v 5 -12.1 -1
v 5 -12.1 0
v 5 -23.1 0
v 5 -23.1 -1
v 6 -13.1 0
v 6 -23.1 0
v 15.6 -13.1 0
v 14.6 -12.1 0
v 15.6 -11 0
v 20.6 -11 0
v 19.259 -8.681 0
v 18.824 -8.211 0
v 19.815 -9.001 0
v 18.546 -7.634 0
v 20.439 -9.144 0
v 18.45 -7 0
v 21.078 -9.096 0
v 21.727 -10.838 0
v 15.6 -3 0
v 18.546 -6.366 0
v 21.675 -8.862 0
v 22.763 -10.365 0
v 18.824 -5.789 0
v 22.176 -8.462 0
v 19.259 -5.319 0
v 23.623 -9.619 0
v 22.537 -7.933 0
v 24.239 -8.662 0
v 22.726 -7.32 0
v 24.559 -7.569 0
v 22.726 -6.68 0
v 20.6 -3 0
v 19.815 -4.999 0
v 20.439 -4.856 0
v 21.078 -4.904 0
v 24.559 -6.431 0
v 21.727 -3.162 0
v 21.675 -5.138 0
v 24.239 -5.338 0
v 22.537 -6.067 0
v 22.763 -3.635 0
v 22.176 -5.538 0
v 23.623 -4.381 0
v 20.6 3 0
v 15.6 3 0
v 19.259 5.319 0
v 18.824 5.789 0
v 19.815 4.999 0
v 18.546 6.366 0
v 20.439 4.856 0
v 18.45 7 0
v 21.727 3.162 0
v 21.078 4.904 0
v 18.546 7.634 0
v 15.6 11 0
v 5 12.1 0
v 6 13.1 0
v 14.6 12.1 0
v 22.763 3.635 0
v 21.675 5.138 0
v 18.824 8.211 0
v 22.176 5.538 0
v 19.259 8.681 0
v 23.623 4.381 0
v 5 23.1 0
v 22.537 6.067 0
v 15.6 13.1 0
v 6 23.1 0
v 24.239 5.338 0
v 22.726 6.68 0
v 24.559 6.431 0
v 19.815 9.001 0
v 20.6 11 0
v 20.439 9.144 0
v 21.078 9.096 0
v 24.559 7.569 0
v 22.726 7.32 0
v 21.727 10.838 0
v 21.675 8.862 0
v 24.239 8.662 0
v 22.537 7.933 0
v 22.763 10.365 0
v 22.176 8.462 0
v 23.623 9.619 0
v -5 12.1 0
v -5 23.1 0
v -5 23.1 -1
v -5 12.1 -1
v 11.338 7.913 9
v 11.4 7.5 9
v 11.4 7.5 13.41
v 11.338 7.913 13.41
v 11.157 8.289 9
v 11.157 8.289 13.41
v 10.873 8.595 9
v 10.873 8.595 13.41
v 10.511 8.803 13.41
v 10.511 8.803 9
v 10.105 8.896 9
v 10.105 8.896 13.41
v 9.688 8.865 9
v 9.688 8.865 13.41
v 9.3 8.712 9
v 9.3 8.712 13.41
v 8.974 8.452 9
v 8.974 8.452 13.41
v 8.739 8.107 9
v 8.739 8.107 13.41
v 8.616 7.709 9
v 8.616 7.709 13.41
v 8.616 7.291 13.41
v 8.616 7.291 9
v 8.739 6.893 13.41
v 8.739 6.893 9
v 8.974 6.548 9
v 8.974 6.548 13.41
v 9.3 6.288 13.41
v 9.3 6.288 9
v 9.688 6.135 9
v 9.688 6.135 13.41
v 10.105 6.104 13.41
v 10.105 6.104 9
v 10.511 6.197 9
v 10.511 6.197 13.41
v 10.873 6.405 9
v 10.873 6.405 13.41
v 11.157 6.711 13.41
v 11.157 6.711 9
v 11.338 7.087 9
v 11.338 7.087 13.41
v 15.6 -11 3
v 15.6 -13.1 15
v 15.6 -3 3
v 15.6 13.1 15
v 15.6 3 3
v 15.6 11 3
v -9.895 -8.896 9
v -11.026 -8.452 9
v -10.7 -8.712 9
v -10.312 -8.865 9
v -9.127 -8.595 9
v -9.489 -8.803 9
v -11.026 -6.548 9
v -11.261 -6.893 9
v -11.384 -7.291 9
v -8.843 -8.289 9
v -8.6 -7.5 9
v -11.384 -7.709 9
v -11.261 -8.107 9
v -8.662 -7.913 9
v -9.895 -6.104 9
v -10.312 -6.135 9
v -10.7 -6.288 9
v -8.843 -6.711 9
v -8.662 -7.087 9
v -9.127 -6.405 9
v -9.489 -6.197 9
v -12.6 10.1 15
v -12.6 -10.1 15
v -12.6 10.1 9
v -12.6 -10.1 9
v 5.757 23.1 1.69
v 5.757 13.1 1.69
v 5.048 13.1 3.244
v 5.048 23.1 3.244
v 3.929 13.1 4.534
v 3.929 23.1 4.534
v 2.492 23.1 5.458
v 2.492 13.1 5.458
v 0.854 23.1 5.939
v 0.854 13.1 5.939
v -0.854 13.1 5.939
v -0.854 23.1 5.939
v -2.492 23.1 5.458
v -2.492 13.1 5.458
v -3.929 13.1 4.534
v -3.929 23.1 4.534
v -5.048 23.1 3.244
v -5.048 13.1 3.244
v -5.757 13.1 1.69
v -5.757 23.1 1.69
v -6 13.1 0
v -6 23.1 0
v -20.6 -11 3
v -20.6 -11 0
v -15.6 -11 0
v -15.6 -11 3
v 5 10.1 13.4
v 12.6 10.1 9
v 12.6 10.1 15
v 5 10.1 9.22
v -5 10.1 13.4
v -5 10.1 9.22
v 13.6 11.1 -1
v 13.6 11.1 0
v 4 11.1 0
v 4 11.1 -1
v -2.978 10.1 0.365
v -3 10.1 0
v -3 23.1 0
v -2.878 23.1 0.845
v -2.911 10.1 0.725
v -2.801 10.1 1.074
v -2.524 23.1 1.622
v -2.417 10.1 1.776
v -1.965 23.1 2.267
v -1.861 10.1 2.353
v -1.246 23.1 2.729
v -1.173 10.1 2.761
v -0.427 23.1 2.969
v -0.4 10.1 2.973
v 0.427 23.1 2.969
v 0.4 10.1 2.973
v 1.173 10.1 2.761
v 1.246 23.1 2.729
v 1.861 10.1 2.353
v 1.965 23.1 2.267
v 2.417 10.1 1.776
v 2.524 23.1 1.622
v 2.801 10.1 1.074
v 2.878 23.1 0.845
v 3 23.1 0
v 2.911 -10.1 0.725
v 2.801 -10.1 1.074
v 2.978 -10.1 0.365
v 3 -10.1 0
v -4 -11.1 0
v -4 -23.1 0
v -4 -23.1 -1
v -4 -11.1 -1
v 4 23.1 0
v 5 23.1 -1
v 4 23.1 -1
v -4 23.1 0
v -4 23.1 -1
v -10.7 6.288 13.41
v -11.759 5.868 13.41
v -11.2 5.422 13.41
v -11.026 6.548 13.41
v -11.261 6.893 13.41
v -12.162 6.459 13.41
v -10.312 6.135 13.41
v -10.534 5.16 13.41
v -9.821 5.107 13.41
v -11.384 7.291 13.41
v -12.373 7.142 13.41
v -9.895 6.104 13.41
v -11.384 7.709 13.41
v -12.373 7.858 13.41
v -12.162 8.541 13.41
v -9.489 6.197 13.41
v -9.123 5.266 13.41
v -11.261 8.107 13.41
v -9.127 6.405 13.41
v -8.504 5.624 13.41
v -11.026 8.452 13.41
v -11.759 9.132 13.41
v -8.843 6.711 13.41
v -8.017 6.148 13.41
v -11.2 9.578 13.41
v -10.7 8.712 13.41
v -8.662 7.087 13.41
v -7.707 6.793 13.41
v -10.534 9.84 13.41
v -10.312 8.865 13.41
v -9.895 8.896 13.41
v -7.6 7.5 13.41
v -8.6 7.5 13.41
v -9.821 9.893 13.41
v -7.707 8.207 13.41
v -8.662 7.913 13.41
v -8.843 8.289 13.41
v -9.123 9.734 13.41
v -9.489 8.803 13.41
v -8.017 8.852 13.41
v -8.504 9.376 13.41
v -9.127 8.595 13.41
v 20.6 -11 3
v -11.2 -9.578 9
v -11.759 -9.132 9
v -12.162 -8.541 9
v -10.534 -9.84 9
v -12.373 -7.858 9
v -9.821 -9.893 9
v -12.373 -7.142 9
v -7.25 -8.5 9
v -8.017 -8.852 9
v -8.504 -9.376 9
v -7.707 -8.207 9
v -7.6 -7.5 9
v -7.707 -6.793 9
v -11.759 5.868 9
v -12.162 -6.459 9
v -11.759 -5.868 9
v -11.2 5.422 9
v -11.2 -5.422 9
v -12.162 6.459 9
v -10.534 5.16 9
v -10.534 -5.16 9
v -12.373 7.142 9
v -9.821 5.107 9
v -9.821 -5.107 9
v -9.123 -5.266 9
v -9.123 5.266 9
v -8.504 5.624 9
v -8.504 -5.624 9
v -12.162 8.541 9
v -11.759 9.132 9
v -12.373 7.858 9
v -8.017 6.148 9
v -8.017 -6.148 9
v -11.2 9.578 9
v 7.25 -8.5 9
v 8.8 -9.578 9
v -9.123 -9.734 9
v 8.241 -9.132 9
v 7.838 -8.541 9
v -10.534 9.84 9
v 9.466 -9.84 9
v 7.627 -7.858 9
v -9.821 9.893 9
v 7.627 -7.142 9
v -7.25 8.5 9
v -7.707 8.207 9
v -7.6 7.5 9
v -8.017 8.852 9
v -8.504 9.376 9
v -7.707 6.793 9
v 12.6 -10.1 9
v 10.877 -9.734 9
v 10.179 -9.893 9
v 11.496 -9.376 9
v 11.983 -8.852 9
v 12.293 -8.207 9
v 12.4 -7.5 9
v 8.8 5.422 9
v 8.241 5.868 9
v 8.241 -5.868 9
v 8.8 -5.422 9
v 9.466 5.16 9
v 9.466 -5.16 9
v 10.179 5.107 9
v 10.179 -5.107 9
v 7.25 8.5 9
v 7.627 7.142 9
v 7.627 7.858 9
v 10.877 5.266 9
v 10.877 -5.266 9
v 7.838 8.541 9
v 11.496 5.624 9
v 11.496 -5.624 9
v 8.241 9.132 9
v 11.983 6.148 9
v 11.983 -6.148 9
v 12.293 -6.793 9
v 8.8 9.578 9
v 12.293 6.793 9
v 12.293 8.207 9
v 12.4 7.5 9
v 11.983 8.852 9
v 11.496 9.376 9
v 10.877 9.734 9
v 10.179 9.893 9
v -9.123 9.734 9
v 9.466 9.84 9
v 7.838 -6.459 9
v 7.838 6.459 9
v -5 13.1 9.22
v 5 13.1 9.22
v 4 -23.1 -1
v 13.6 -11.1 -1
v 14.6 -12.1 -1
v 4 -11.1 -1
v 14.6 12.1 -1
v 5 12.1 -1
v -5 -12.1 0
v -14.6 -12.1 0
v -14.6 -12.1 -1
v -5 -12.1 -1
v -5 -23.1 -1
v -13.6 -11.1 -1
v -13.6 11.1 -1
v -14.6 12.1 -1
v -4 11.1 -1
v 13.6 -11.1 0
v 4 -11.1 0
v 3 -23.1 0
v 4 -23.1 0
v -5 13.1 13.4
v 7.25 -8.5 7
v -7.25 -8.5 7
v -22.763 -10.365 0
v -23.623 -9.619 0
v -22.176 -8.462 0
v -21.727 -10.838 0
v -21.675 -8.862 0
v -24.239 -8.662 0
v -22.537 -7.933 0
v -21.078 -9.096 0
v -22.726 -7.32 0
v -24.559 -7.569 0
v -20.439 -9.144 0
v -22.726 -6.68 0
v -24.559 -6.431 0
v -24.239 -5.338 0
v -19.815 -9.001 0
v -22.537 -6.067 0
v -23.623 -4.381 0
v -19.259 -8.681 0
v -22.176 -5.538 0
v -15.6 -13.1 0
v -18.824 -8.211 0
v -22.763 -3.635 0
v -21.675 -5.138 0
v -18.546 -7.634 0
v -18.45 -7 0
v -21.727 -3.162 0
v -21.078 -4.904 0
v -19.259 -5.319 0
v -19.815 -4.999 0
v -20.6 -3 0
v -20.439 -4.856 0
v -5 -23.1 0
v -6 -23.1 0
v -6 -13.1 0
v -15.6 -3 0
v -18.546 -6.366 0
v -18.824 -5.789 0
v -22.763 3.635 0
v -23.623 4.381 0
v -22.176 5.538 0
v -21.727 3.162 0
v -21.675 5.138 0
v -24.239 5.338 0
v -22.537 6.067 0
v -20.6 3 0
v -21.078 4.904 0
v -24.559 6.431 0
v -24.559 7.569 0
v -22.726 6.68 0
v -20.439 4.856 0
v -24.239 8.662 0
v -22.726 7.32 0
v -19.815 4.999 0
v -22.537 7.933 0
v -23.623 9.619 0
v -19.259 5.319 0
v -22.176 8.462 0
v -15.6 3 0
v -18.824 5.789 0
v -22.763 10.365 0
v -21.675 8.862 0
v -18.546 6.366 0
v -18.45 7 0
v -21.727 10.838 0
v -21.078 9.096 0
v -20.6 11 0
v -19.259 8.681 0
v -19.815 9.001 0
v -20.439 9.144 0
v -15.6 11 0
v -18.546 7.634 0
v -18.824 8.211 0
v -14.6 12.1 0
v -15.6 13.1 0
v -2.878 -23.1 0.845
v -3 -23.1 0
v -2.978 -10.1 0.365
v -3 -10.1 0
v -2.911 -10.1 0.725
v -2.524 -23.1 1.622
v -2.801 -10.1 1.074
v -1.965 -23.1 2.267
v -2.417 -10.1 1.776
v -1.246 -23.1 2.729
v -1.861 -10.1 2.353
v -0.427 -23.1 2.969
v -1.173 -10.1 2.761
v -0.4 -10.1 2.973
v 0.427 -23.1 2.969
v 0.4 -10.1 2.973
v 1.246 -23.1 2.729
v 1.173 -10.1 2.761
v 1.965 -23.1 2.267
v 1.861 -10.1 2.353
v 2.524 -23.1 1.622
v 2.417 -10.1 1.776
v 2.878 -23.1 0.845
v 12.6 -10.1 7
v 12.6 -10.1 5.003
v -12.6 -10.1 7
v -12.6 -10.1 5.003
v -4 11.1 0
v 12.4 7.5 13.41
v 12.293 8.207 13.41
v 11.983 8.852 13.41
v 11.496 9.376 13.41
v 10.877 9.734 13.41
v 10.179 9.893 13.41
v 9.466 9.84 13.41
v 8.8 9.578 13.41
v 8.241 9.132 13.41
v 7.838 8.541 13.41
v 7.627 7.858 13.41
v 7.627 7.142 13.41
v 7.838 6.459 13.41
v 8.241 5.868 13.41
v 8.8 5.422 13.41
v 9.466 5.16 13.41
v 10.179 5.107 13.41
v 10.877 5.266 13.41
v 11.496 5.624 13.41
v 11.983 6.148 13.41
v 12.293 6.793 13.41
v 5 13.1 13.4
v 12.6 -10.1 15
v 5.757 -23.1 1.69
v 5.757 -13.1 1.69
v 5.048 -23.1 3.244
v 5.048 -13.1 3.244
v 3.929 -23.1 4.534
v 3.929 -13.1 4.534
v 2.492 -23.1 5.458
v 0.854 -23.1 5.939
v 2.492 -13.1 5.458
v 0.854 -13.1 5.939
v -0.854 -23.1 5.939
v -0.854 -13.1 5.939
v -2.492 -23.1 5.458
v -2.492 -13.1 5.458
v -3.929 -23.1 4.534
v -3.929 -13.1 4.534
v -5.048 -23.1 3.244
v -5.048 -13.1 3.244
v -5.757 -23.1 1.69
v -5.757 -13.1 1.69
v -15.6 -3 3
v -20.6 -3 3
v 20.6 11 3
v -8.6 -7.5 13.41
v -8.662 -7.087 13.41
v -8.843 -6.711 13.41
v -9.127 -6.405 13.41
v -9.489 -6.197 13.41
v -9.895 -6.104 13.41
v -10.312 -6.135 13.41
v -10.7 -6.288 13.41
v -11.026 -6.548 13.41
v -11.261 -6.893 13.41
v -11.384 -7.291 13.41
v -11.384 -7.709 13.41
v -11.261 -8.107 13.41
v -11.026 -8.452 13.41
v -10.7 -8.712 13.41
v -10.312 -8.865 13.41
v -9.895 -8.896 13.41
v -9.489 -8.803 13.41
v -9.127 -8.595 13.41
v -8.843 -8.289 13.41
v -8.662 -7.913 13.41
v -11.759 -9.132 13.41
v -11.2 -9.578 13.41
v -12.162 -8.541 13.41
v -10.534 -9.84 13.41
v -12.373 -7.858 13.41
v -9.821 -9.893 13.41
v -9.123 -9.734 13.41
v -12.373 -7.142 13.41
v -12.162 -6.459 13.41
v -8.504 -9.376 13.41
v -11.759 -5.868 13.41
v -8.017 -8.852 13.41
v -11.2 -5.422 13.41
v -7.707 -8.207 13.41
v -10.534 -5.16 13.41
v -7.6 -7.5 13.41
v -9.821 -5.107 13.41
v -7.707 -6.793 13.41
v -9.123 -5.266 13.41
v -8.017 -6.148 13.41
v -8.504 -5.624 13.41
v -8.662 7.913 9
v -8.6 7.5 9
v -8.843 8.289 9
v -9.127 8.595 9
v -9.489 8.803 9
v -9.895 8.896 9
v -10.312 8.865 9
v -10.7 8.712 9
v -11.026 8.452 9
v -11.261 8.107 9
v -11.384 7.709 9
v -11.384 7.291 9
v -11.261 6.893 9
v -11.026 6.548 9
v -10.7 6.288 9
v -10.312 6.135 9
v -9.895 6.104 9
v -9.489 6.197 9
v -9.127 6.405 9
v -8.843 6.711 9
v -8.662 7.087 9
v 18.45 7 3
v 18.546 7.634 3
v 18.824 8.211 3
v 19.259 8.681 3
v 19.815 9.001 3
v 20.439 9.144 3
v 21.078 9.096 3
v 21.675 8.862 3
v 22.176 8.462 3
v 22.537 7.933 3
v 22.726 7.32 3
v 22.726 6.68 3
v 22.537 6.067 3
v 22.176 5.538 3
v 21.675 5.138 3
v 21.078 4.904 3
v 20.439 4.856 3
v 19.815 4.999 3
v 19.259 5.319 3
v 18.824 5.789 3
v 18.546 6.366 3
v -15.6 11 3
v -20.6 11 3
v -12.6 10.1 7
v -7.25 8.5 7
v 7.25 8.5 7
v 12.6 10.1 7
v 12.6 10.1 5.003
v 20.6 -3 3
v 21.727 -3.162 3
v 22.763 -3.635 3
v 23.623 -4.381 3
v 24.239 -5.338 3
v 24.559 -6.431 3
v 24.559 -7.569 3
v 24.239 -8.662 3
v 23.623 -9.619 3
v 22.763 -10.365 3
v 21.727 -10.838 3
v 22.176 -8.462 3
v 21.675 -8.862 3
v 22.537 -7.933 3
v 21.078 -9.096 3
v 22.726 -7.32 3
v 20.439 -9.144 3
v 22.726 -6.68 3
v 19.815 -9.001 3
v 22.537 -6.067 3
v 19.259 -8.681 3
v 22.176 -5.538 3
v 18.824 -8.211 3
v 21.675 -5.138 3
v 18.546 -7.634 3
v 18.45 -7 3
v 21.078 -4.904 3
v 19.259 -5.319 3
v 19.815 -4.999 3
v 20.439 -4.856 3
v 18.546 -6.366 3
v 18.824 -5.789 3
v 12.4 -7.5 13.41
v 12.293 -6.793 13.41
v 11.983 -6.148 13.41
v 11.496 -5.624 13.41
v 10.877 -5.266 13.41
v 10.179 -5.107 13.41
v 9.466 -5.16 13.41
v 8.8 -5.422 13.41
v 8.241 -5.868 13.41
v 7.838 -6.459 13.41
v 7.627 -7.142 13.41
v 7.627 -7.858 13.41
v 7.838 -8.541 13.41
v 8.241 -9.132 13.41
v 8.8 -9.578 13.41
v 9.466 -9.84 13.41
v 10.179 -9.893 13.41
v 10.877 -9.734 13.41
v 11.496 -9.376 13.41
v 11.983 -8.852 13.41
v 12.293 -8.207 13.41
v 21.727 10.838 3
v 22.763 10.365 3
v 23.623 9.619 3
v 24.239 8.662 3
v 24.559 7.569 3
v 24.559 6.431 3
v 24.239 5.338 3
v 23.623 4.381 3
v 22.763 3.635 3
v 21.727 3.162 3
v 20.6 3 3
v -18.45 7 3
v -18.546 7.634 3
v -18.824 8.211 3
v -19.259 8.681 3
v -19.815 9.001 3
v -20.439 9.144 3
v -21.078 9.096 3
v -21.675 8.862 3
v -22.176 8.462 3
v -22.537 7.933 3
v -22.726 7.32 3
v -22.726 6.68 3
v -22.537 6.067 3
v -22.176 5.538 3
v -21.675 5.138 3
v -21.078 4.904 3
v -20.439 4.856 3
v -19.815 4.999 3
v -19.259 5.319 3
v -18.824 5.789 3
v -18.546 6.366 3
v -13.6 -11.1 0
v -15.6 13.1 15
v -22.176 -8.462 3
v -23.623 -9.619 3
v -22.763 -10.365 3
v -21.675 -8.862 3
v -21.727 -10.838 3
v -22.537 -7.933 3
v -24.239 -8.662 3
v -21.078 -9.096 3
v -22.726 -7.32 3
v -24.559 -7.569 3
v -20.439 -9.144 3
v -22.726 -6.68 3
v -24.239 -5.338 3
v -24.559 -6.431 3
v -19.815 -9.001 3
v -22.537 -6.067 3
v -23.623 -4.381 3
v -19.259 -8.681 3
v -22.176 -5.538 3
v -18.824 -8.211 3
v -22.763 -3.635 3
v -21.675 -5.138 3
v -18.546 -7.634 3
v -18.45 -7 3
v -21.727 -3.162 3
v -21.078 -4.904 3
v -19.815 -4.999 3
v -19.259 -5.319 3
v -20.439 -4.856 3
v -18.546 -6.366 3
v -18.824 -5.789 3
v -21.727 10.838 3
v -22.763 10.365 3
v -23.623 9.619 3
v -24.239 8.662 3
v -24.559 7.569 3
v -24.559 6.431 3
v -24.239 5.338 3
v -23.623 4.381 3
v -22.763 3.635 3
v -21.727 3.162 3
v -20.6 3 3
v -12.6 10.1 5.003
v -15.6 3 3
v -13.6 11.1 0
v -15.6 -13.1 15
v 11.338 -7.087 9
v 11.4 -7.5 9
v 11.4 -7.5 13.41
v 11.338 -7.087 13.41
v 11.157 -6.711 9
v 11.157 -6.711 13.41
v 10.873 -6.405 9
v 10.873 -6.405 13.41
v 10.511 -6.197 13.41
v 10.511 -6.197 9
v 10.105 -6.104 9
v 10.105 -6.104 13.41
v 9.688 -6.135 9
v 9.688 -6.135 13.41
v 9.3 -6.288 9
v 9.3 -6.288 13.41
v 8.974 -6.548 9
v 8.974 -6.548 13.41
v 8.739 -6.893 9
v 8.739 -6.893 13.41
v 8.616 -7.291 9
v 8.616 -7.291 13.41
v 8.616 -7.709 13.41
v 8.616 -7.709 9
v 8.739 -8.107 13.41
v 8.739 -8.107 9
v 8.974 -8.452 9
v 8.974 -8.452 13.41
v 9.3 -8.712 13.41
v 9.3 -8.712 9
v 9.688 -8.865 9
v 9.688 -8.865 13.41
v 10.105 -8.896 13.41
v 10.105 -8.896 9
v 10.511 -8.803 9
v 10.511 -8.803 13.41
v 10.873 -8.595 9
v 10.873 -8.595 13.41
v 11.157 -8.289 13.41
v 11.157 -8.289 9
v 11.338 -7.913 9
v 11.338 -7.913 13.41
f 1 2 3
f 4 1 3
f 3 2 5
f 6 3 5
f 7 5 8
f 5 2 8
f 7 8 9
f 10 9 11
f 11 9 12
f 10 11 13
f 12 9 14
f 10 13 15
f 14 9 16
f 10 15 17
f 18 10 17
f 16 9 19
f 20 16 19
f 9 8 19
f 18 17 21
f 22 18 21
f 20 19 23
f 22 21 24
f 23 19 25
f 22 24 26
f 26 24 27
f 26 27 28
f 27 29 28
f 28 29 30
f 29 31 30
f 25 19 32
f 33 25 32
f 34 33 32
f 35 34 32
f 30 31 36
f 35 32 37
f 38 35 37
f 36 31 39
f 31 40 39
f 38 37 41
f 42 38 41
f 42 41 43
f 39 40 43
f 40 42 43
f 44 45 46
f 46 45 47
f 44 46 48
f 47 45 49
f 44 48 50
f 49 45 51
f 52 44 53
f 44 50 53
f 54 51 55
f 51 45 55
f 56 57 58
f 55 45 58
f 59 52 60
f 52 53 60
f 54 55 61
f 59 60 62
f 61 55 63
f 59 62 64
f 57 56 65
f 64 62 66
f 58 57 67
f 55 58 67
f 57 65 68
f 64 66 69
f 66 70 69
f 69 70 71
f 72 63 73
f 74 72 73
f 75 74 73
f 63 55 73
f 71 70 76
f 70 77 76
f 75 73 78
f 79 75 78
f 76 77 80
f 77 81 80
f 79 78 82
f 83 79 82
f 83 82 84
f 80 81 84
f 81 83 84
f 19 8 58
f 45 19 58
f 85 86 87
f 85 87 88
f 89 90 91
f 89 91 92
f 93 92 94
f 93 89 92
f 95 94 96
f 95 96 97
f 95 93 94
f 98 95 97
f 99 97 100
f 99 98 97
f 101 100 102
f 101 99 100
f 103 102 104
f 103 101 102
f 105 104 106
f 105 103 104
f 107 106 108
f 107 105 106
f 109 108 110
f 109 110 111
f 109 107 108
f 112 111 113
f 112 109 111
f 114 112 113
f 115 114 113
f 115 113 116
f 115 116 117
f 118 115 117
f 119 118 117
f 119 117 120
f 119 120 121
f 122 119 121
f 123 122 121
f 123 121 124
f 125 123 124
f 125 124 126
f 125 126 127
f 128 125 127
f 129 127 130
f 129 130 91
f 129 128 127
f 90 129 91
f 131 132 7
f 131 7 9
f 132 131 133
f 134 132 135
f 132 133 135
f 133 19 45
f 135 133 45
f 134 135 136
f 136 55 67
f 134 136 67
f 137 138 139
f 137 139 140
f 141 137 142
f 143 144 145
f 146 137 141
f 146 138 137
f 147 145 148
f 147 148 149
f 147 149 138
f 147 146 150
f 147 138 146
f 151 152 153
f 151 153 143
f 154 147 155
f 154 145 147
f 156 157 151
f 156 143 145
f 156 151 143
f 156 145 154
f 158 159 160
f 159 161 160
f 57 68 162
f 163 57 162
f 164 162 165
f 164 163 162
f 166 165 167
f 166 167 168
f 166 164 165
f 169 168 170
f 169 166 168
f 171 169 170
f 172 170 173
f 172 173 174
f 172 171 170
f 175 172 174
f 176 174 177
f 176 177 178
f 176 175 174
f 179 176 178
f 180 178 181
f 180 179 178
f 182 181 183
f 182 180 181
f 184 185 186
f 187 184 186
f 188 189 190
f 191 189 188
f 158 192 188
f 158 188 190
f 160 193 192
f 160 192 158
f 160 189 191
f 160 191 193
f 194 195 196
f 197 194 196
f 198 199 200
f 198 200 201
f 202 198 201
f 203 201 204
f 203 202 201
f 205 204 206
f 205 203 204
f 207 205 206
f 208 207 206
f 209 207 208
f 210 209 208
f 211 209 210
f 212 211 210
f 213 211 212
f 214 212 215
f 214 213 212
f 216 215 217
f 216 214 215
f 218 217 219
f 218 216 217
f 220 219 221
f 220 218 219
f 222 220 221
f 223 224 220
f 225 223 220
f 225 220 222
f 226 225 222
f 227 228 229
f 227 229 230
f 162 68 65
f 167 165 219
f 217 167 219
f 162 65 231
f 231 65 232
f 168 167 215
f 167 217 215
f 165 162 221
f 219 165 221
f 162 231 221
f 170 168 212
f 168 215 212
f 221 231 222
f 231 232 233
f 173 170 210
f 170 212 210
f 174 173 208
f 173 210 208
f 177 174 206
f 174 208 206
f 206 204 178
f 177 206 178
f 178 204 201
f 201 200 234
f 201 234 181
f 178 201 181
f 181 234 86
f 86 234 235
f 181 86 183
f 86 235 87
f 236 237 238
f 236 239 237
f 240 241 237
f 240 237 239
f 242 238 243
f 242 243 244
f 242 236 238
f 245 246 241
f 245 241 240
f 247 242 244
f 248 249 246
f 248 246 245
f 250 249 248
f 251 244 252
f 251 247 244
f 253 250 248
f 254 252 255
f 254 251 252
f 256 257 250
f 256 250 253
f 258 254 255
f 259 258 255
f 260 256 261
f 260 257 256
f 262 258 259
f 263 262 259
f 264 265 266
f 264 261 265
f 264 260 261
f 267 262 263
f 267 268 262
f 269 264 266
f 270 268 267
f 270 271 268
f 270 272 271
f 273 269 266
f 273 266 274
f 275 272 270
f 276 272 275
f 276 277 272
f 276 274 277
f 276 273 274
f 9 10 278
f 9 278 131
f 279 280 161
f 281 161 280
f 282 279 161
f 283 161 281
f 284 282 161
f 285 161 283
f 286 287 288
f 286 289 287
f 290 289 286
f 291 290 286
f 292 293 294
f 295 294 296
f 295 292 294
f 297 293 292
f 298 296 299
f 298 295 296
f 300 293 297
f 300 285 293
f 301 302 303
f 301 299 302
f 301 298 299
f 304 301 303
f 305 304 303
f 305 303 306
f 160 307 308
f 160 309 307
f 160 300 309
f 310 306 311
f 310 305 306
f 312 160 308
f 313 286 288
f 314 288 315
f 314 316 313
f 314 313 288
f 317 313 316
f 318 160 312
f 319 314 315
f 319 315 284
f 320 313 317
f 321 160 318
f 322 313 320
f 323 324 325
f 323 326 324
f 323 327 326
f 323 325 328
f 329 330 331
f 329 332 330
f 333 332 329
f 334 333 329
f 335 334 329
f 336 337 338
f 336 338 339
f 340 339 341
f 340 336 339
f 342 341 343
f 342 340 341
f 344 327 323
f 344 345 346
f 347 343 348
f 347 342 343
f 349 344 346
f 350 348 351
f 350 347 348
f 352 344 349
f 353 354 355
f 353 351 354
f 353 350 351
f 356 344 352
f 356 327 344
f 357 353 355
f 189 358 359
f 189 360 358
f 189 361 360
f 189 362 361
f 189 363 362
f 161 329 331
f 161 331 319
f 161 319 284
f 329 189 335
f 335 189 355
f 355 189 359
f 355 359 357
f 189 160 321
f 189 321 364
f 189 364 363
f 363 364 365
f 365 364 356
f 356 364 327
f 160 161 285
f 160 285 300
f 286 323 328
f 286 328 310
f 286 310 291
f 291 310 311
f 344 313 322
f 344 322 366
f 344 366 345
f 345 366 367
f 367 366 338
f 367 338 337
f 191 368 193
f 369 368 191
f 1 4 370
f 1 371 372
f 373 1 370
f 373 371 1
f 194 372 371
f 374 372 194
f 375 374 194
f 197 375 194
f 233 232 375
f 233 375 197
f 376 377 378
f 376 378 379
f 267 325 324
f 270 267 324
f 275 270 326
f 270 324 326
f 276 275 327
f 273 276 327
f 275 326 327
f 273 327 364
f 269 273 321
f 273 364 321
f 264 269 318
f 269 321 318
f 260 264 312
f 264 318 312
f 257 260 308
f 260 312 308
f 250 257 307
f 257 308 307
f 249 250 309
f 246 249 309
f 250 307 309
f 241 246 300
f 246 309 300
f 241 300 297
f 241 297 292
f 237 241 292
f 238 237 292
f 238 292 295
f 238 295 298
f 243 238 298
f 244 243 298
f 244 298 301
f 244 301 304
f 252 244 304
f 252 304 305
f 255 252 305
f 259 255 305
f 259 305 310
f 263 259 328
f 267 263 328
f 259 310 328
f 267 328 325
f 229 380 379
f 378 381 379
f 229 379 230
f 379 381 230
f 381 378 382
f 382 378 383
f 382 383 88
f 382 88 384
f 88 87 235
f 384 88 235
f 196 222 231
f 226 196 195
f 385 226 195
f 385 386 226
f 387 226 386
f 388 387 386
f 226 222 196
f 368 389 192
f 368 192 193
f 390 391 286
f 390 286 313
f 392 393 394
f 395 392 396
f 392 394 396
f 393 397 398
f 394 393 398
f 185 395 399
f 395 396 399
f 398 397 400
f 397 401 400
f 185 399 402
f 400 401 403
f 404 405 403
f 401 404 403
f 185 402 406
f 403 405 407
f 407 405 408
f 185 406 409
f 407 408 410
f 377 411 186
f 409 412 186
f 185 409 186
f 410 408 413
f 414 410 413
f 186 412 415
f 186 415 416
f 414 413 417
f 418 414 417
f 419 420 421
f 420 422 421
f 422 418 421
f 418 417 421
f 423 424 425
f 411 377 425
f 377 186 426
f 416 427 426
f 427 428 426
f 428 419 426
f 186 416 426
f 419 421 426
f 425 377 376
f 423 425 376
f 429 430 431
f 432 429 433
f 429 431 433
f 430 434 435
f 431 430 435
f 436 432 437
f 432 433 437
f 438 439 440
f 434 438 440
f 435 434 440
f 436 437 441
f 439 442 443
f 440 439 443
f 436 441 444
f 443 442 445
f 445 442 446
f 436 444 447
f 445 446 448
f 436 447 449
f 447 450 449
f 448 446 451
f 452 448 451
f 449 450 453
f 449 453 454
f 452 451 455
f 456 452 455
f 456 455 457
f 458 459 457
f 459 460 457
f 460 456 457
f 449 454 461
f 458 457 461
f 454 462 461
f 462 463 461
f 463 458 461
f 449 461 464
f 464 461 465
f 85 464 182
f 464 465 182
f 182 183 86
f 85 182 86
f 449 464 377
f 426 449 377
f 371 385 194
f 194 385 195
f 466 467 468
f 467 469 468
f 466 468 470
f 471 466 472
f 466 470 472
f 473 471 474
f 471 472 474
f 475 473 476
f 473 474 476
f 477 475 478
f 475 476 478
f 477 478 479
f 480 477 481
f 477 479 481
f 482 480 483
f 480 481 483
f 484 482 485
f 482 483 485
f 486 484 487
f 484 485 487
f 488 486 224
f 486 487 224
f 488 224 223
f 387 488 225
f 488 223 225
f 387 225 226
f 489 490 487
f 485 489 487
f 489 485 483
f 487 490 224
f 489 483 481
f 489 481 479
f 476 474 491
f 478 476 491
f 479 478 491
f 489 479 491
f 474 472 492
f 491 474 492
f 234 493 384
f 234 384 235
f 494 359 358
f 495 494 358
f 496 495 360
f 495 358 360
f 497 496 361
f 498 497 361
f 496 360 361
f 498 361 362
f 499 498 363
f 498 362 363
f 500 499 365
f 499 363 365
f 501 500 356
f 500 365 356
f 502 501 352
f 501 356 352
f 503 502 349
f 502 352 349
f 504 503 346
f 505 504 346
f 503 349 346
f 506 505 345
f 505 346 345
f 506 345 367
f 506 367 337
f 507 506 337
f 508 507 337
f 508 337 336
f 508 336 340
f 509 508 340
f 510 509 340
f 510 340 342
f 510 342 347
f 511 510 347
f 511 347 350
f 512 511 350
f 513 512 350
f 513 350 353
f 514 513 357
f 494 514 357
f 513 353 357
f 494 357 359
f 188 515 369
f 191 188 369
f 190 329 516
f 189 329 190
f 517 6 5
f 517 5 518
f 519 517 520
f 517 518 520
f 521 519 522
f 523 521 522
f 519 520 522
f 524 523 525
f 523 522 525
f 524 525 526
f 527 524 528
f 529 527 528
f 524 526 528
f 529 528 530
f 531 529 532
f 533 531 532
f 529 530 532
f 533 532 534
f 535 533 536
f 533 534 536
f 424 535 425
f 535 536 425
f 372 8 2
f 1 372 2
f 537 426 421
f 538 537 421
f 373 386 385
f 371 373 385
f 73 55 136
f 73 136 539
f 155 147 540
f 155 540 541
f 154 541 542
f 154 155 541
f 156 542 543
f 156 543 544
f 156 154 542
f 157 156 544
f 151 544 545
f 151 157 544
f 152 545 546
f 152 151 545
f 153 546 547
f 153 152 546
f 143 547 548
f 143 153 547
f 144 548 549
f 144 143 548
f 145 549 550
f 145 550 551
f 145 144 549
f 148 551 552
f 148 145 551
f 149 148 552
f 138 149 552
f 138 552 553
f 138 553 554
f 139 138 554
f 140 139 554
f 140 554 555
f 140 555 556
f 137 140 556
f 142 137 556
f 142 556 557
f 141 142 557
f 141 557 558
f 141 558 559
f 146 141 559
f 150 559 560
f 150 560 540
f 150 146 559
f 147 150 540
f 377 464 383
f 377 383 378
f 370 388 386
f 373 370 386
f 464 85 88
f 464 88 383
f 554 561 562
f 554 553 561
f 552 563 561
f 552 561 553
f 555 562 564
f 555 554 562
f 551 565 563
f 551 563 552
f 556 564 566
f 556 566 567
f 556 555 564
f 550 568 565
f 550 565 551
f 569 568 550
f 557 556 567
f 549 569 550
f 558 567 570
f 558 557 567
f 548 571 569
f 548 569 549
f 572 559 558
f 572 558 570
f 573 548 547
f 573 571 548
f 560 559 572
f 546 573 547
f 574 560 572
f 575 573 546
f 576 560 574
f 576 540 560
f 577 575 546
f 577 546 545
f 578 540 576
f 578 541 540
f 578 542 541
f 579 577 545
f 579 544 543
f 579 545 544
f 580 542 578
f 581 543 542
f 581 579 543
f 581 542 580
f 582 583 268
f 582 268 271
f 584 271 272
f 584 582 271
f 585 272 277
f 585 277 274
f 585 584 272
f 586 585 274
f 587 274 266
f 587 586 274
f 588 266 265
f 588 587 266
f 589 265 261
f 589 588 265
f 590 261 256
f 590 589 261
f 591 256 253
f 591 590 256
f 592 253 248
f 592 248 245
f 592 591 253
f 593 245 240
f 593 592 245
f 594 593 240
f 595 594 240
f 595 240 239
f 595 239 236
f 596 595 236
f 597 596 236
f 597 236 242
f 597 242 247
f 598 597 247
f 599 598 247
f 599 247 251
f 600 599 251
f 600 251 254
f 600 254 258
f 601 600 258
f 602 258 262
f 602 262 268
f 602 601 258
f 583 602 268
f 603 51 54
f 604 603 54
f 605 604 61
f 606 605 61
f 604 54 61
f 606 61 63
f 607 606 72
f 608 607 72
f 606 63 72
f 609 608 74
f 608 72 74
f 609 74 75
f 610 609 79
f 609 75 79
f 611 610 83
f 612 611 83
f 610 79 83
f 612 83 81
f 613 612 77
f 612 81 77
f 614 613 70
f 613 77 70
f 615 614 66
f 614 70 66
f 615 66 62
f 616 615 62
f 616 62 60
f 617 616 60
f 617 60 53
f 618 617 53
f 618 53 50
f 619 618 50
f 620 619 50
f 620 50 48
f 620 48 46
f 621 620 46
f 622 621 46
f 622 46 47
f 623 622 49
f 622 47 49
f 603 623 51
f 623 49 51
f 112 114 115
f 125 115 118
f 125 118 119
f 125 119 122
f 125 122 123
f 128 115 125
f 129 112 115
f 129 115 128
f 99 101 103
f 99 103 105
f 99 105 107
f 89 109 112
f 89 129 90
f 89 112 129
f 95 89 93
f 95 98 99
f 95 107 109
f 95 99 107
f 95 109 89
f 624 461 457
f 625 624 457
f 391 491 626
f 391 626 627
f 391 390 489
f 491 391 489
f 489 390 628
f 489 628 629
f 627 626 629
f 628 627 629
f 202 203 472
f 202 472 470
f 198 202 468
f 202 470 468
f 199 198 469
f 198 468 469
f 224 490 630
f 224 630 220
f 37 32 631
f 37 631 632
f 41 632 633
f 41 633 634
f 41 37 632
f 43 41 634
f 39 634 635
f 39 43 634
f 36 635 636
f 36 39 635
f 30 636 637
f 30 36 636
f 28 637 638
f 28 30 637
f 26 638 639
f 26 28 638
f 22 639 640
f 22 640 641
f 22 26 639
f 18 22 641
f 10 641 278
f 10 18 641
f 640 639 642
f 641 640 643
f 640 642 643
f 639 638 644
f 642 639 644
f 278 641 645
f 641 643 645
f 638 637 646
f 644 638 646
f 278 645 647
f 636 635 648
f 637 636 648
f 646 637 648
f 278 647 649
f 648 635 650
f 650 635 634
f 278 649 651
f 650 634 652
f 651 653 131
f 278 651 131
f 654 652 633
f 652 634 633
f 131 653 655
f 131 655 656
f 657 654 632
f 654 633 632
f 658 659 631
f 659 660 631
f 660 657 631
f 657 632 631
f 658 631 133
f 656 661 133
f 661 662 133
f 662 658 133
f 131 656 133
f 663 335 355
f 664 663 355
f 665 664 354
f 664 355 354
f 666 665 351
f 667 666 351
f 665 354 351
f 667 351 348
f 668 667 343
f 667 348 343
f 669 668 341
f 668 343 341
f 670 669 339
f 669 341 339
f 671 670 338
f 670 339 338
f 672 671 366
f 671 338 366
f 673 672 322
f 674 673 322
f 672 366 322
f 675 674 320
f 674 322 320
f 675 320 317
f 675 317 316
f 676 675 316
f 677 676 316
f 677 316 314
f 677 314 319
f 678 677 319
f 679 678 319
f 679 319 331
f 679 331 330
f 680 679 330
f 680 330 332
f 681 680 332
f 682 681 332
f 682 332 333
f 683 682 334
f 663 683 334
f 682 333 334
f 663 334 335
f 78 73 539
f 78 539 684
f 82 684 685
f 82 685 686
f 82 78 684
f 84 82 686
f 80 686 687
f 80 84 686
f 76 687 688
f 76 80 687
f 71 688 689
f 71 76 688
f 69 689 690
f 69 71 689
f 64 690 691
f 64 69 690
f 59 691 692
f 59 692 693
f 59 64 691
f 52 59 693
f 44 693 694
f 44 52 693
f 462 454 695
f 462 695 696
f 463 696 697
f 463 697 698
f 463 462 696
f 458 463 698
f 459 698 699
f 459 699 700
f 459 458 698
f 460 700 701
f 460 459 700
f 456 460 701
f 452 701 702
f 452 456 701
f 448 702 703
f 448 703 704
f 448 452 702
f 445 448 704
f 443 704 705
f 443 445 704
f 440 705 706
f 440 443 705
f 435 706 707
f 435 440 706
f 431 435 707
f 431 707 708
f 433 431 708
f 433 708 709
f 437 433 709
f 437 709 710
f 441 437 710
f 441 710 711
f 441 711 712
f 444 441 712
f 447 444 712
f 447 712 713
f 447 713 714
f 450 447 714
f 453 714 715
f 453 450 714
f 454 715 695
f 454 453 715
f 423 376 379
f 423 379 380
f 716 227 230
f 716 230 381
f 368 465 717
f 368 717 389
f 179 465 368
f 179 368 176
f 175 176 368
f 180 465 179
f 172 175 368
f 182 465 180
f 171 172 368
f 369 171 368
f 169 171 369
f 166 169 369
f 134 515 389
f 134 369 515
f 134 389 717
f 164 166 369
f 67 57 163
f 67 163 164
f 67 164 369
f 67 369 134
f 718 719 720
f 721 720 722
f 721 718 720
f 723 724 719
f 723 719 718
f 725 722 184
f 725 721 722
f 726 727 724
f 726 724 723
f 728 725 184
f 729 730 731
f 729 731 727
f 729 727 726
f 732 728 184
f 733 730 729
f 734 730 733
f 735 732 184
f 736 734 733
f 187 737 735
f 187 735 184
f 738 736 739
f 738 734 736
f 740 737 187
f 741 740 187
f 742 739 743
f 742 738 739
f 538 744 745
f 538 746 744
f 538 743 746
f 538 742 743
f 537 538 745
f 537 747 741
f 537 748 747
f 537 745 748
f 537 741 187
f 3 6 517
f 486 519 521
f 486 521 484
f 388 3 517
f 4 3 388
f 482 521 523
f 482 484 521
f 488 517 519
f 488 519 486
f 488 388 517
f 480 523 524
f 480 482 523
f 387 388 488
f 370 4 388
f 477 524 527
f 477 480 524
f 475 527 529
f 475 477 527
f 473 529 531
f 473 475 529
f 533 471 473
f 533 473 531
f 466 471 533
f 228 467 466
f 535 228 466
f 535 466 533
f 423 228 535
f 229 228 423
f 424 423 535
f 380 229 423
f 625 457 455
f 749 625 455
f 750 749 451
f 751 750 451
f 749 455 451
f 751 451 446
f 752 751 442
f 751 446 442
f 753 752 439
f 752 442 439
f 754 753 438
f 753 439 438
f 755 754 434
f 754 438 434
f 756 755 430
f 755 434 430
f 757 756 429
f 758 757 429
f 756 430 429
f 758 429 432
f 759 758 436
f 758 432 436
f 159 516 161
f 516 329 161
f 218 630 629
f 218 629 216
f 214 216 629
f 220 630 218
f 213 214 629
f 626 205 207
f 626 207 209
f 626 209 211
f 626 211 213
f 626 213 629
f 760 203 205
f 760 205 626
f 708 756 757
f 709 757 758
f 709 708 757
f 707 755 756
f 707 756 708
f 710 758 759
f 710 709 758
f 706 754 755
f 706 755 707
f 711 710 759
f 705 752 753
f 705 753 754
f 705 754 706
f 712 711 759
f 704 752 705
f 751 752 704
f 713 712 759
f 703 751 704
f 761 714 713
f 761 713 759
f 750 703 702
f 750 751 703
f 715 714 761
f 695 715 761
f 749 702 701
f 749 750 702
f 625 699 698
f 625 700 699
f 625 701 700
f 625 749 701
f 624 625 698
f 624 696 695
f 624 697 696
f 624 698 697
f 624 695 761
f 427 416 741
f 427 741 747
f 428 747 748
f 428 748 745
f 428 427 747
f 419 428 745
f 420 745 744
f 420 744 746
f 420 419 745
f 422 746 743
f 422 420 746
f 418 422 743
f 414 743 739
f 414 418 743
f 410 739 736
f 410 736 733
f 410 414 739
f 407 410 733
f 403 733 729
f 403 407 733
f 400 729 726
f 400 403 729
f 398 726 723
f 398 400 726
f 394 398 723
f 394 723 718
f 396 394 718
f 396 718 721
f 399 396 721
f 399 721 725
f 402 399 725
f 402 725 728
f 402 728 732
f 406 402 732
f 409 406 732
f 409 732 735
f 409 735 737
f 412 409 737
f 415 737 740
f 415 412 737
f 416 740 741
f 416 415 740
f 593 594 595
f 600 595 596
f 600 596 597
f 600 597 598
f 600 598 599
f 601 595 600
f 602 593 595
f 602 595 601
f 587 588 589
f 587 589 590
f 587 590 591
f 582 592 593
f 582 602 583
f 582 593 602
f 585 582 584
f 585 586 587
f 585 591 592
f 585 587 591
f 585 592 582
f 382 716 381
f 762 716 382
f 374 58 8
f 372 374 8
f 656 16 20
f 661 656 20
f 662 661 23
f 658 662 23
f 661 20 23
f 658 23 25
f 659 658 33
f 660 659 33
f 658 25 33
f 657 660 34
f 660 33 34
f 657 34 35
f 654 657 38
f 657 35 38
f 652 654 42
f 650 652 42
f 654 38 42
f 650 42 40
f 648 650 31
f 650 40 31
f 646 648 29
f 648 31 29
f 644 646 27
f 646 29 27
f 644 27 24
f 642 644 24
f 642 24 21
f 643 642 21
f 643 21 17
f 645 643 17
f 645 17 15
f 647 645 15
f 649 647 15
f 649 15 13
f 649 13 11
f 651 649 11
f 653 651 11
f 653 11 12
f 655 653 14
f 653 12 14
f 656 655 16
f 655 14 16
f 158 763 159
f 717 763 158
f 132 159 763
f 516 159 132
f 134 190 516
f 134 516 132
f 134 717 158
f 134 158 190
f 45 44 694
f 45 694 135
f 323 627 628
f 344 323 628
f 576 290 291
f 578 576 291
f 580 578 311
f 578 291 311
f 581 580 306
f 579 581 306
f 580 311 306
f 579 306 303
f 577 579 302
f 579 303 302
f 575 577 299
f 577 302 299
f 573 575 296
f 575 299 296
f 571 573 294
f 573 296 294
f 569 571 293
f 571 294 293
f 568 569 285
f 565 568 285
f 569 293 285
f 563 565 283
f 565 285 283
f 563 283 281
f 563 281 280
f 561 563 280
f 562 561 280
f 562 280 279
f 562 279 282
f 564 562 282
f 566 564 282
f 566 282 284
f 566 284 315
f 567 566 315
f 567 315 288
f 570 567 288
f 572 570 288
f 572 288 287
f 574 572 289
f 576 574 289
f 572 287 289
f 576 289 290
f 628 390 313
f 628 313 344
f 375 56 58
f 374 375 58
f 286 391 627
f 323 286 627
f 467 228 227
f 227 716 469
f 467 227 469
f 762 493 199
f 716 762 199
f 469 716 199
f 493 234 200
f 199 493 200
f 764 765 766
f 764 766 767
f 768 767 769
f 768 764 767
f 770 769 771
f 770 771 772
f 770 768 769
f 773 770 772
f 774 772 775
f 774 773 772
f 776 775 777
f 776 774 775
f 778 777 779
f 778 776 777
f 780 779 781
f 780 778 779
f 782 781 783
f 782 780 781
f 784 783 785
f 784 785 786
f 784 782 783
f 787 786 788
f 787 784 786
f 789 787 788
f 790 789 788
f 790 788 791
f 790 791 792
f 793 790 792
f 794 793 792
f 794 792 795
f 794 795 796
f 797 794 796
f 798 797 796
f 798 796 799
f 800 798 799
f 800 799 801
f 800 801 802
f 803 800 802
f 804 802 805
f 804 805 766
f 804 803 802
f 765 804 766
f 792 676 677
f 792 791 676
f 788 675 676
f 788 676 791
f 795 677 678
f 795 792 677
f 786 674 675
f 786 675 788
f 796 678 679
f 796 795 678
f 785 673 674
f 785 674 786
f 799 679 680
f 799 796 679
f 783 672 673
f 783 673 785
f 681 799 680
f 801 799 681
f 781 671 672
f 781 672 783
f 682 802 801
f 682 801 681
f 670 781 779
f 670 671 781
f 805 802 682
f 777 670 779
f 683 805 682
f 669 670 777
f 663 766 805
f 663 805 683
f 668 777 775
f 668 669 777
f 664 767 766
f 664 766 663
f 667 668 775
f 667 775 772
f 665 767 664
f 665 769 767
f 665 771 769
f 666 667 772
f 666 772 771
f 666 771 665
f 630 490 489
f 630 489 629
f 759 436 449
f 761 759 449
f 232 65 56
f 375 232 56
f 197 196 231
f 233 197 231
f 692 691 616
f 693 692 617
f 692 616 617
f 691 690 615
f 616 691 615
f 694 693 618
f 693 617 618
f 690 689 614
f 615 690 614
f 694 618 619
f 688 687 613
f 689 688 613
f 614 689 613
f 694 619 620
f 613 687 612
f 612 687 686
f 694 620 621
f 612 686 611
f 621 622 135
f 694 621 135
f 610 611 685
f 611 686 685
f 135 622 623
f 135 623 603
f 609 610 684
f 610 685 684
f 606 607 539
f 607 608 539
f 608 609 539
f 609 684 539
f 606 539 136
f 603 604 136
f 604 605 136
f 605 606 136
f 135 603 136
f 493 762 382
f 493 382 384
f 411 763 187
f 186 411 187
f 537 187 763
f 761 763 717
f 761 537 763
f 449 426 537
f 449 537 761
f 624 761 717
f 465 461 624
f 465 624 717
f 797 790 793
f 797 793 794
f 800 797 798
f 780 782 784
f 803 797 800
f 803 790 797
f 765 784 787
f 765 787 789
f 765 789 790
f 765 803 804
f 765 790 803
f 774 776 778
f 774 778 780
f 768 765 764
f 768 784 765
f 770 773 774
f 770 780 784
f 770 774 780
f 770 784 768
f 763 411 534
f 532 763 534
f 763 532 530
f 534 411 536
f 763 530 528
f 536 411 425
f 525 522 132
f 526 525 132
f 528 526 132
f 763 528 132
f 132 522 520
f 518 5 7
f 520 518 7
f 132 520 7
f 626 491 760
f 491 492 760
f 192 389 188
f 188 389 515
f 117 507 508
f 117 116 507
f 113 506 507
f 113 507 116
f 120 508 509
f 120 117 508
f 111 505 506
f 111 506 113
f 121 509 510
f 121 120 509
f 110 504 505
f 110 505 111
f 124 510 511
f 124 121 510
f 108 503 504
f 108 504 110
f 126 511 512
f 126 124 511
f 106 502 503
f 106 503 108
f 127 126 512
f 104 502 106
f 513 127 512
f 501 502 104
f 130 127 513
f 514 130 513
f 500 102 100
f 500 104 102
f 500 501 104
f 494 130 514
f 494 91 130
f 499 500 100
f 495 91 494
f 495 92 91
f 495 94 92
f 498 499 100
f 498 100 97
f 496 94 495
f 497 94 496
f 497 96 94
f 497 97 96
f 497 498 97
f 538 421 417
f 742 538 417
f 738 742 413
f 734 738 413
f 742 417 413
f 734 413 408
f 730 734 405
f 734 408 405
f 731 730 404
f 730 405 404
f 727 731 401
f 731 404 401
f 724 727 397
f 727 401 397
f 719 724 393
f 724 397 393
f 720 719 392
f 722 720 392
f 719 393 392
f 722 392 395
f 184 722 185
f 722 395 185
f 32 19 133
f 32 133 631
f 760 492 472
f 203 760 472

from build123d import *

# Parameters (mm, degrees)
SKETCH1_W            = 31.2
SKETCH1_H            = 26.2
BOSS_EXTRUDE1_DEPTH  = 15
SHELL2_T             = -3
BOSS_EXTRUDE2_DEPTH  = 10
CUT_EXTRUDE2_DEPTH   = 43.175822458
SKETCH8_R            = 2.15
BOSS_EXTRUDE5_DEPTH  = 3
BOSS_EXTRUDE4_DEPTH  = 1
SKETCH14_W           = 25.2
SKETCH14_H           = 20.2
CUT_EXTRUDE5_DEPTH   = 37.163102743
BOSS_EXTRUDE8_REACH  = 45.959
BOSS_EXTRUDE9_START  = -8
SKETCH15_W           = 31.2
SKETCH15_H           = 26.2
SKETCH15_W_2         = 14.5
SKETCH15_H_2         = 17
BOSS_EXTRUDE9_DEPTH  = 2
SKETCH16_R           = 2.4
SKETCH16_R_2         = 1.4
BOSS_EXTRUDE10_DEPTH = 4.41
CUT_EXTRUDE6_REACH   = 48.267
SKETCH5_W            = 10
SKETCH5_H            = 4.18


with BuildPart() as part:
    # Sketch1 → Boss-Extrude1 (new body)
    with BuildSketch(Plane.XY):
        Rectangle(SKETCH1_W, SKETCH1_H)
    extrude(amount=BOSS_EXTRUDE1_DEPTH)

    # Shell2
    shell2_openings = [part.faces().sort_by_distance(p)[0] for p in [
        (0, 0, 0),
    ]]
    offset(amount=SHELL2_T, openings=shell2_openings, kind=Kind.INTERSECTION)

    # Sketch3 → Boss-Extrude2 (add)
    with BuildSketch(Plane(origin=(0, 13.1, 0), x_dir=(1, 0, 0), z_dir=(0, 1, 0))):
        with BuildLine():
            Line((-6, 0), (-3, 0))
            ThreePointArc((-3, 0), (0, -3), (3, 0))
            Line((3, 0), (6, 0))
            ThreePointArc((6, 0), (0, -6), (-6, 0))
        make_face()
    boss_extrude2 = extrude(amount=BOSS_EXTRUDE2_DEPTH)

    # Mirror1: Boss-Extrude2 across plane
    add(boss_extrude2.mirror(Plane.ZX))

    # Sketch4 → Cut-Extrude2 (cut, through all)
    with BuildSketch(Plane(origin=(0, 13.1, 0), x_dir=(1, 0, 0), z_dir=(0, 1, 0))):
        with BuildLine():
            Line((-3, 0), (3, 0))
            ThreePointArc((3, 0), (0, -3), (-3, 0))
        make_face()
    extrude(amount=-CUT_EXTRUDE2_DEPTH, mode=Mode.SUBTRACT)

    # Sketch8 → Boss-Extrude5 (add)
    # profile 1 of 2: a face of its own
    with BuildSketch(Plane(origin=(0, 0, 0), x_dir=(-1, 0, 0), z_dir=(0, 0, -1))):
        with BuildLine():
            Line((-15.6, 3), (-15.6, 11))
            Line((-15.6, 11), (-20.6, 11))
            ThreePointArc((-20.6, 11), (-24.6, 7), (-20.6, 3))
            Line((-20.6, 3), (-15.6, 3))
        make_face()
        with Locations((-20.6, 7)):
            Circle(SKETCH8_R, mode=Mode.SUBTRACT)
    # profile 2 of 2: a face of its own
    with BuildSketch(Plane(origin=(0, 0, 0), x_dir=(-1, 0, 0), z_dir=(0, 0, -1))):
        with BuildLine():
            Line((-15.6, -11), (-15.6, -3))
            Line((-15.6, -3), (-20.6, -3))
            ThreePointArc((-20.6, -3), (-24.6, -7), (-20.6, -11))
            Line((-20.6, -11), (-15.6, -11))
        make_face()
        with Locations((-20.6, -7)):
            Circle(SKETCH8_R, mode=Mode.SUBTRACT)
    boss_extrude5 = extrude(amount=-BOSS_EXTRUDE5_DEPTH)

    # Mirror3: Boss-Extrude5 across plane
    add(boss_extrude5.mirror(Plane(origin=(0, 0, 0), x_dir=(0, 0, 1), z_dir=(1, 0, 0))))

    # Sketch7 → Boss-Extrude4 (add)
    with BuildSketch(Plane(origin=(0, 0, 0), x_dir=(-1, 0, 0), z_dir=(0, 0, -1))):
        Polygon((-4, -23.1), (-4, -11.1), (-13.6, -11.1), (-13.6, 11.1), (-4, 11.1), (-4, 23.1), (-5, 23.1), (-5, 12.1), (-14.6, 12.1), (-14.6, -12.1), (-5, -12.1), (-5, -23.1), align=None)
    boss_extrude4 = extrude(amount=BOSS_EXTRUDE4_DEPTH)

    # Mirror2: Boss-Extrude4 across plane
    add(boss_extrude4.mirror(Plane(origin=(0, 0, 0), x_dir=(0, 0, 1), z_dir=(1, 0, 0))))

    # Sketch14 → Cut-Extrude5 (cut, through all)
    with BuildSketch(Plane(origin=(0, 0, 12), x_dir=(-1, 0, 0), z_dir=(0, 0, -1))):
        Rectangle(SKETCH14_W, SKETCH14_H)
    extrude(amount=-CUT_EXTRUDE5_DEPTH, mode=Mode.SUBTRACT)

    # Sketch11 → Boss-Extrude8 (add, up to next)
    with BuildSketch(Plane(origin=(0, -10.1, 0), x_dir=(1, 0, 0), z_dir=(0, 1, 0)), mode=Mode.PRIVATE) as boss_extrude8_sk1:
        with BuildLine():
            Line((3, 0), (12.6, 0))
            Line((12.6, 0), (12.6, -5.002969955))
            Line((12.6, -5.002969955), (2.801311304, -1.073617705))
            ThreePointArc((2.801311304, -1.073617705), (2.949909652, -0.545924027), (3, 0))
        make_face()
    boss_extrude8_tool1 = extrude(boss_extrude8_sk1.sketch, amount=BOSS_EXTRUDE8_REACH, mode=Mode.PRIVATE) - part.part
    # Sketch11 → Boss-Extrude8 (add, up to next)
    with BuildSketch(Plane(origin=(0, -10.1, 0), x_dir=(1, 0, 0), z_dir=(0, 1, 0)), mode=Mode.PRIVATE) as boss_extrude8_sk2:
        with BuildLine():
            Line((-12.6, -5.002969955), (-2.801311304, -1.073617705))
            ThreePointArc((-2.801311304, -1.073617705), (-2.949909652, -0.545924027), (-3, 0))
            Line((-3, 0), (-12.6, 0))
            Line((-12.6, 0), (-12.6, -5.002969955))
        make_face()
    boss_extrude8_tool2 = extrude(boss_extrude8_sk2.sketch, amount=BOSS_EXTRUDE8_REACH, mode=Mode.PRIVATE) - part.part
    add(boss_extrude8_tool1.solids().sort_by_distance((8.785084, -10.1, 1.737296))[0])
    add(boss_extrude8_tool2.solids().sort_by_distance((-8.785084, -10.1, 1.737296))[0])

    # Sketch15 → Boss-Extrude9 (add)
    with BuildSketch(Plane.XY.offset(15).offset(BOSS_EXTRUDE9_START)):
        Rectangle(SKETCH15_W, SKETCH15_H)
        Rectangle(SKETCH15_W_2, SKETCH15_H_2, mode=Mode.SUBTRACT)
    extrude(amount=BOSS_EXTRUDE9_DEPTH)

    # Sketch16 → Boss-Extrude10 (add)
    # profile 1 of 4: a face of its own
    with BuildSketch(Plane.XY.offset(9)):
        with Locations((-10, 7.5)):
            Circle(SKETCH16_R)
        with Locations((-10, 7.5)):
            Circle(SKETCH16_R_2, mode=Mode.SUBTRACT)
    # profile 2 of 4: a face of its own
    with BuildSketch(Plane.XY.offset(9)):
        with Locations((10, 7.5)):
            Circle(SKETCH16_R)
        with Locations((10, 7.5)):
            Circle(SKETCH16_R_2, mode=Mode.SUBTRACT)
    # profile 3 of 4: a face of its own
    with BuildSketch(Plane.XY.offset(9)):
        with Locations((-10, -7.5)):
            Circle(SKETCH16_R)
        with Locations((-10, -7.5)):
            Circle(SKETCH16_R_2, mode=Mode.SUBTRACT)
    # profile 4 of 4: a face of its own
    with BuildSketch(Plane.XY.offset(9)):
        with Locations((10, -7.5)):
            Circle(SKETCH16_R)
        with Locations((10, -7.5)):
            Circle(SKETCH16_R_2, mode=Mode.SUBTRACT)
    extrude(amount=BOSS_EXTRUDE10_DEPTH)

    # Sketch5 → Cut-Extrude6 (cut, up to next)
    with BuildSketch(Plane(origin=(0, 13.1, 0), x_dir=(1, 0, 0), z_dir=(0, 1, 0)), mode=Mode.PRIVATE) as cut_extrude6_sk1:
        with Locations((0, -11.31)):
            Rectangle(SKETCH5_W, SKETCH5_H)
    cut_extrude6_tool1 = extrude(cut_extrude6_sk1.sketch, amount=-CUT_EXTRUDE6_REACH, mode=Mode.PRIVATE) & part.part
    add(cut_extrude6_tool1.solids().sort_by_distance((0, 13.1, 11.31))[0], mode=Mode.SUBTRACT)


solid = part.part
